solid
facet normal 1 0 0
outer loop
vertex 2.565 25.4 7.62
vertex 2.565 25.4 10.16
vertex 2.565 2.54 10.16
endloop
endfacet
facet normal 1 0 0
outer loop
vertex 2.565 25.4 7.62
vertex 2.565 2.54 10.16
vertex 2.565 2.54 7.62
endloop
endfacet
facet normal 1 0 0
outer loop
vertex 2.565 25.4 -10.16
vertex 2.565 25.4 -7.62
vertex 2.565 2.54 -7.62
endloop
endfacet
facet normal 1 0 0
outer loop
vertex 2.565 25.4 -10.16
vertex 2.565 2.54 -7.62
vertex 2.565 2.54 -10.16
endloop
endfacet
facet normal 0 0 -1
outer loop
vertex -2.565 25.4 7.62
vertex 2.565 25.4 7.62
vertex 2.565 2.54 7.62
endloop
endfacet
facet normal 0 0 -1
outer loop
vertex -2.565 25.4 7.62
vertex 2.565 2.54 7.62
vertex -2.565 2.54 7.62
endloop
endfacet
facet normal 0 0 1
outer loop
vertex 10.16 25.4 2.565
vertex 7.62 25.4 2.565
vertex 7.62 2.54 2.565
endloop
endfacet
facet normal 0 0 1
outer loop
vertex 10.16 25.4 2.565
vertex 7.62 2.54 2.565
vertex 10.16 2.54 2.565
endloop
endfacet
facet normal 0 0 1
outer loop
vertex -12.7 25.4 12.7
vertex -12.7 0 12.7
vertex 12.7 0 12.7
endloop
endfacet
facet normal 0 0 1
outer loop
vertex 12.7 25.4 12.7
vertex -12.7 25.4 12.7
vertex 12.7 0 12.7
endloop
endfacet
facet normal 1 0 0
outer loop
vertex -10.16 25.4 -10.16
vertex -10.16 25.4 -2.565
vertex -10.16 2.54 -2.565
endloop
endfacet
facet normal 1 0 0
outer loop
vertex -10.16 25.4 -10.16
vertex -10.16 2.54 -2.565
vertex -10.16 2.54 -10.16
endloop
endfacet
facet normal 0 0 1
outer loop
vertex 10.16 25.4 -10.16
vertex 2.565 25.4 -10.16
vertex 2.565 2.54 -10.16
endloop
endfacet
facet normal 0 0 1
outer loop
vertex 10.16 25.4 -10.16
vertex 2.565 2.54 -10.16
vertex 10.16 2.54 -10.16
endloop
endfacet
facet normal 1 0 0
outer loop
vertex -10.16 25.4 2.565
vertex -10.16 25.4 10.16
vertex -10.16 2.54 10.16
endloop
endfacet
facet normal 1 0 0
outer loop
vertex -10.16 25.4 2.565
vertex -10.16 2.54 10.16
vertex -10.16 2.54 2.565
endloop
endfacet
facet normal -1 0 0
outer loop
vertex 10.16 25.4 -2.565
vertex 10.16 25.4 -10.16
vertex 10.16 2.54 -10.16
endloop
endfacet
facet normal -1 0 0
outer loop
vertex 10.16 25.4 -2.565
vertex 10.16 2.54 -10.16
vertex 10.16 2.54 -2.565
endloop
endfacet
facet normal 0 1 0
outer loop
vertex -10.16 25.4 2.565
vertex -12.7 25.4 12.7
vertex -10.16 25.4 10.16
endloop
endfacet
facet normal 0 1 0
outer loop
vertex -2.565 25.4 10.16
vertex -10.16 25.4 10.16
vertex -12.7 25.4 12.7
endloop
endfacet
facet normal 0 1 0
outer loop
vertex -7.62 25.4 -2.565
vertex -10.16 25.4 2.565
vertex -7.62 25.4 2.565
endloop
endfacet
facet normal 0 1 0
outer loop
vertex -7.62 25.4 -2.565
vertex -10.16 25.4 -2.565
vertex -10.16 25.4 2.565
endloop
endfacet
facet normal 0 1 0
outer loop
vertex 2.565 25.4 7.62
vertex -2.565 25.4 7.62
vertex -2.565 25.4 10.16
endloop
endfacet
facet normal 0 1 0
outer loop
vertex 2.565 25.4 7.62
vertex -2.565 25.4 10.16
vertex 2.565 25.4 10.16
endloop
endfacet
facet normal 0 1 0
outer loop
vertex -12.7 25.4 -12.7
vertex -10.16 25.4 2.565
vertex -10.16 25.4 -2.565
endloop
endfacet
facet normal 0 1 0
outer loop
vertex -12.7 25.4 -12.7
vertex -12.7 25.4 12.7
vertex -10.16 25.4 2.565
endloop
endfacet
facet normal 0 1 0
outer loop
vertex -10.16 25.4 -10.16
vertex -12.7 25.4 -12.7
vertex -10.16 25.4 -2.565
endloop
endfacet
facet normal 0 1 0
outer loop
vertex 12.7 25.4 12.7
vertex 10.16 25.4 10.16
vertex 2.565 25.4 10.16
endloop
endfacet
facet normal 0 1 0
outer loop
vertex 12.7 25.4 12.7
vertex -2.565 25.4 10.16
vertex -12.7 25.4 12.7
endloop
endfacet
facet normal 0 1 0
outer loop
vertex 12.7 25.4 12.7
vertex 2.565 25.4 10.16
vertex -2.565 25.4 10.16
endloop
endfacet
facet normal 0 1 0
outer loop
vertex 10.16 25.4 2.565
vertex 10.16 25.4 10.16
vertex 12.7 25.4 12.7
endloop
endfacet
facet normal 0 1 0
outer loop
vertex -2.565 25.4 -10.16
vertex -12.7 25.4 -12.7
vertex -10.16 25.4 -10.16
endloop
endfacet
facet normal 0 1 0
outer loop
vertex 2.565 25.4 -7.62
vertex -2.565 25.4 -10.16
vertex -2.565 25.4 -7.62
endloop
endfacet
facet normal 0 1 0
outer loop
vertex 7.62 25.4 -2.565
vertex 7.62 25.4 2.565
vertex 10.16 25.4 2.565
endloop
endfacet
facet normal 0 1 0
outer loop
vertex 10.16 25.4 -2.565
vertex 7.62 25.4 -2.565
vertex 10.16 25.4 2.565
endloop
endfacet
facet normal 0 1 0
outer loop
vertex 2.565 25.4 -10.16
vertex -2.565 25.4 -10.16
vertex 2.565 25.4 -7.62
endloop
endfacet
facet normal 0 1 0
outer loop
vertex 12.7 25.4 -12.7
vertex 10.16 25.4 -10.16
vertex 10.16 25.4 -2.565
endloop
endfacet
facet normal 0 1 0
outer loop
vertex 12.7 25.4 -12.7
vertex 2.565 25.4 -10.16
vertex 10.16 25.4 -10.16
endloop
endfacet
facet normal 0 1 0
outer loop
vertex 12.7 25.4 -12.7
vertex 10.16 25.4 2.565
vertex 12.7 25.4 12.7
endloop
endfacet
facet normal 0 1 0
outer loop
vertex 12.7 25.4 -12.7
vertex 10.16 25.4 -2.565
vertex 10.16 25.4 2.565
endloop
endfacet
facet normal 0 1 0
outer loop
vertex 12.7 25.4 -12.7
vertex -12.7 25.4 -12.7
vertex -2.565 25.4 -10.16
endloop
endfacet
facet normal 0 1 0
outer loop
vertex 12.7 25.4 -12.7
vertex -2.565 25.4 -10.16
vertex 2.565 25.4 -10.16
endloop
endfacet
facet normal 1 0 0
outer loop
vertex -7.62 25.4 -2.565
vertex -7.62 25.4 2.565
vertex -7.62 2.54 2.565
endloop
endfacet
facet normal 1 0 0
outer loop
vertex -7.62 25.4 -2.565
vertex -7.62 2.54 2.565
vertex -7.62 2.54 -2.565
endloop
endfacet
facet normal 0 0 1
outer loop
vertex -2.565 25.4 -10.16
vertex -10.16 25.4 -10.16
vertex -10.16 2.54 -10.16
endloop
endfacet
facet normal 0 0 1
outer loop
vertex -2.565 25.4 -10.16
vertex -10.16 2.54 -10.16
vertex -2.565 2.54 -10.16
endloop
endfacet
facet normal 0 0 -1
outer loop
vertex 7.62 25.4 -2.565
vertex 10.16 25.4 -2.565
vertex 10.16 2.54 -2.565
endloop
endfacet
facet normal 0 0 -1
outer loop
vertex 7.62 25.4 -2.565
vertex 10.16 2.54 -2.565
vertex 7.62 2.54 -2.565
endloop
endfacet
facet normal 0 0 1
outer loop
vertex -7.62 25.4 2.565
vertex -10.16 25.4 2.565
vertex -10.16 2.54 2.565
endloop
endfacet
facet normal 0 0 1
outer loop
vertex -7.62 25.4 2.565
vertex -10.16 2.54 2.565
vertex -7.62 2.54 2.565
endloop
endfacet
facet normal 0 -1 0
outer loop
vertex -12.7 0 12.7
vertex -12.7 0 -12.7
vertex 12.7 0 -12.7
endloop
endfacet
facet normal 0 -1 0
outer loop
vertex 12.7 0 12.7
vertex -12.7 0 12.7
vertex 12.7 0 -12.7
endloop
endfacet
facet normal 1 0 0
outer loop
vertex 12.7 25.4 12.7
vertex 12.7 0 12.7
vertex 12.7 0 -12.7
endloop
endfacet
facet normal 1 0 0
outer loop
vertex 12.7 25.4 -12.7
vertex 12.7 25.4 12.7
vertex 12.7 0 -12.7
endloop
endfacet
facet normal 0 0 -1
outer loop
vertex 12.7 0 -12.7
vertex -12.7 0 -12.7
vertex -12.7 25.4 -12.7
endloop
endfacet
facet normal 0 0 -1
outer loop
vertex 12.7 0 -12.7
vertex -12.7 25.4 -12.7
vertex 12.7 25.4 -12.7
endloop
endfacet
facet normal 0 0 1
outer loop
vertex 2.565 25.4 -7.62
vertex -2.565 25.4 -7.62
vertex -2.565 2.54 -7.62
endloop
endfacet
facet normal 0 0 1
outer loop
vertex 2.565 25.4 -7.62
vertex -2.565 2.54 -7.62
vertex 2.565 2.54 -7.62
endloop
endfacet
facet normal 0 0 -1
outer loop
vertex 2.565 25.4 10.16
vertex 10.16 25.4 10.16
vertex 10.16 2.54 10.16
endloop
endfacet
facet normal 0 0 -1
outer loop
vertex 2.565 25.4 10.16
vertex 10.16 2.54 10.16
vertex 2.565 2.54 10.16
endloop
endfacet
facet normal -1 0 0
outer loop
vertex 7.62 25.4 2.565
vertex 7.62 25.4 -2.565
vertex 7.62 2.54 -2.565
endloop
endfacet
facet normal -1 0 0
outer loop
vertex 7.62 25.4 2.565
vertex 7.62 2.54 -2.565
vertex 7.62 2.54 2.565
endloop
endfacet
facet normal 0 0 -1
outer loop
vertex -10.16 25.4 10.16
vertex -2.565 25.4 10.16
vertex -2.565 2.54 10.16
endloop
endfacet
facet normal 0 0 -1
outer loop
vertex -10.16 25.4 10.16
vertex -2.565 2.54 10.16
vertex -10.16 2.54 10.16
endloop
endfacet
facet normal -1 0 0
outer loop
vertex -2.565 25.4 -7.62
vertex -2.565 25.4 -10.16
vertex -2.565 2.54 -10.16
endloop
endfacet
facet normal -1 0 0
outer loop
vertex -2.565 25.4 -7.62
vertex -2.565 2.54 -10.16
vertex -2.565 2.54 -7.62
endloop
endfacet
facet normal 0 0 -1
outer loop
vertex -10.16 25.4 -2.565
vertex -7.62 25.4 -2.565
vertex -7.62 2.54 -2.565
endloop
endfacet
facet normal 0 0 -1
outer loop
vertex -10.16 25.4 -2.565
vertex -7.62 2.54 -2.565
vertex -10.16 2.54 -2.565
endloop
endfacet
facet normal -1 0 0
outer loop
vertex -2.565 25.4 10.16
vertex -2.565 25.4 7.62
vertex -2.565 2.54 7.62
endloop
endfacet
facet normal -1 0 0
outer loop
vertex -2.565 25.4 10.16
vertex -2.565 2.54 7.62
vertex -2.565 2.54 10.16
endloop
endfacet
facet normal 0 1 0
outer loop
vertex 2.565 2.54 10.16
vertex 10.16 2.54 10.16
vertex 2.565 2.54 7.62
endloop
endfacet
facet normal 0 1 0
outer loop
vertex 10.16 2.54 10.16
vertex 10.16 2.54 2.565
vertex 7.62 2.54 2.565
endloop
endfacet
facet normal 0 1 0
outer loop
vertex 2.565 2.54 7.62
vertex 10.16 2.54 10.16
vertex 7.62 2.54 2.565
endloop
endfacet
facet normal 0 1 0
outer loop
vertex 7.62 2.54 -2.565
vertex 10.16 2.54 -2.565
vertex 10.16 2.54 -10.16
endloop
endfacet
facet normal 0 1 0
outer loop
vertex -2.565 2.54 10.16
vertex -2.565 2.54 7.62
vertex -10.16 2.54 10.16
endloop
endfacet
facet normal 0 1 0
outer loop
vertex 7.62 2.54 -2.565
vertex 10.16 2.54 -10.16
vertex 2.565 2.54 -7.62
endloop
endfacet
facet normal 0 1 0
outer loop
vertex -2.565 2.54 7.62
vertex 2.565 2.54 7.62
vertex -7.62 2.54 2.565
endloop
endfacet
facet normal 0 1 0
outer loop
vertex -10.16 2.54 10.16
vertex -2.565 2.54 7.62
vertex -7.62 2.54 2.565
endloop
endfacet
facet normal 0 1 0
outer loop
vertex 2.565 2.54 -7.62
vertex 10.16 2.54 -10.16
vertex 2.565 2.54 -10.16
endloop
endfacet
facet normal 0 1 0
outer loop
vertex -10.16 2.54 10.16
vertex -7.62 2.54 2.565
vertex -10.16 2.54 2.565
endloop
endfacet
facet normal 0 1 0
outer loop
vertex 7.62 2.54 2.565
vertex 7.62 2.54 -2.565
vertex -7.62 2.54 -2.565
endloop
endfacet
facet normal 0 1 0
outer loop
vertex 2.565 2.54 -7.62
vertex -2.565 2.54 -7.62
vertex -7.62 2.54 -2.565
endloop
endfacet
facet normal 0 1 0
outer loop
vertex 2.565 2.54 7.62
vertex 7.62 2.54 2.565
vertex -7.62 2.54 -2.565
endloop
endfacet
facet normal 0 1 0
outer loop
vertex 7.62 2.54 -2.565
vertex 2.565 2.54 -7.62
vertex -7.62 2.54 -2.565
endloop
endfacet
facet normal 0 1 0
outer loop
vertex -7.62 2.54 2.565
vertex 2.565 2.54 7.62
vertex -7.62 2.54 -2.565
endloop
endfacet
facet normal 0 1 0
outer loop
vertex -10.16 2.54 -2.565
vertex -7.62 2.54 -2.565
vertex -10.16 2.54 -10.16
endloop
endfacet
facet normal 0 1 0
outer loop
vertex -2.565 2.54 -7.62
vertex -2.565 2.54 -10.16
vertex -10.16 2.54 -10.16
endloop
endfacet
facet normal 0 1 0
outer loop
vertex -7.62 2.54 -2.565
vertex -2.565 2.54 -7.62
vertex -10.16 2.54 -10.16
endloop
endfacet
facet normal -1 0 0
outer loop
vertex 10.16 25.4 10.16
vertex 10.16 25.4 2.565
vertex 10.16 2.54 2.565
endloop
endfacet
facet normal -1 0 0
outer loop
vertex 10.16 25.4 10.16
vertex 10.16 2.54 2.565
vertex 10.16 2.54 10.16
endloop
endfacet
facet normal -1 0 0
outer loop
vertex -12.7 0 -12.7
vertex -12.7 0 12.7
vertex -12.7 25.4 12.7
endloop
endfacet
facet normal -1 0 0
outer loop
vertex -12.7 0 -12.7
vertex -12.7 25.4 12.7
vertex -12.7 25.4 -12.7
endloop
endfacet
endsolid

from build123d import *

# Parameters (mm, degrees)
SKETCH1_W           = 25.4
SKETCH1_H           = 25.4
BOSS_EXTRUDE1_DEPTH = 25.4
CUT_EXTRUDE2_DEPTH  = 22.86


with BuildPart() as part:
    # Sketch1 → Boss-Extrude1 (new body)
    with BuildSketch(Plane(origin=(0, 0, 0), x_dir=(1, 0, 0), z_dir=(0, 1, 0))):
        Rectangle(SKETCH1_W, SKETCH1_H)
    extrude(amount=BOSS_EXTRUDE1_DEPTH)

    # Sketch3 → Cut-Extrude2 (cut)
    with BuildSketch(Plane(origin=(0, 25.4, 0), x_dir=(1, 0, 0), z_dir=(0, 1, 0))):
        Polygon((10.16, 2.565122784), (7.62, 2.565122784), (7.62, -2.565122784), (10.16, -2.565122784), (10.16, -10.16), (2.565122784, -10.16), (2.565122784, -7.62), (-2.565122784, -7.62), (-2.565122784, -10.16), (-10.16, -10.16), (-10.16, -2.565122784), (-7.62, -2.565122784), (-7.62, 2.565122784), (-10.16, 2.565122784), (-10.16, 10.16), (-2.565122784, 10.16), (-2.565122784, 7.62), (2.565122784, 7.62), (2.565122784, 10.16), (10.16, 10.16), align=None)
    extrude(amount=-CUT_EXTRUDE2_DEPTH, mode=Mode.SUBTRACT)


solid = part.part
